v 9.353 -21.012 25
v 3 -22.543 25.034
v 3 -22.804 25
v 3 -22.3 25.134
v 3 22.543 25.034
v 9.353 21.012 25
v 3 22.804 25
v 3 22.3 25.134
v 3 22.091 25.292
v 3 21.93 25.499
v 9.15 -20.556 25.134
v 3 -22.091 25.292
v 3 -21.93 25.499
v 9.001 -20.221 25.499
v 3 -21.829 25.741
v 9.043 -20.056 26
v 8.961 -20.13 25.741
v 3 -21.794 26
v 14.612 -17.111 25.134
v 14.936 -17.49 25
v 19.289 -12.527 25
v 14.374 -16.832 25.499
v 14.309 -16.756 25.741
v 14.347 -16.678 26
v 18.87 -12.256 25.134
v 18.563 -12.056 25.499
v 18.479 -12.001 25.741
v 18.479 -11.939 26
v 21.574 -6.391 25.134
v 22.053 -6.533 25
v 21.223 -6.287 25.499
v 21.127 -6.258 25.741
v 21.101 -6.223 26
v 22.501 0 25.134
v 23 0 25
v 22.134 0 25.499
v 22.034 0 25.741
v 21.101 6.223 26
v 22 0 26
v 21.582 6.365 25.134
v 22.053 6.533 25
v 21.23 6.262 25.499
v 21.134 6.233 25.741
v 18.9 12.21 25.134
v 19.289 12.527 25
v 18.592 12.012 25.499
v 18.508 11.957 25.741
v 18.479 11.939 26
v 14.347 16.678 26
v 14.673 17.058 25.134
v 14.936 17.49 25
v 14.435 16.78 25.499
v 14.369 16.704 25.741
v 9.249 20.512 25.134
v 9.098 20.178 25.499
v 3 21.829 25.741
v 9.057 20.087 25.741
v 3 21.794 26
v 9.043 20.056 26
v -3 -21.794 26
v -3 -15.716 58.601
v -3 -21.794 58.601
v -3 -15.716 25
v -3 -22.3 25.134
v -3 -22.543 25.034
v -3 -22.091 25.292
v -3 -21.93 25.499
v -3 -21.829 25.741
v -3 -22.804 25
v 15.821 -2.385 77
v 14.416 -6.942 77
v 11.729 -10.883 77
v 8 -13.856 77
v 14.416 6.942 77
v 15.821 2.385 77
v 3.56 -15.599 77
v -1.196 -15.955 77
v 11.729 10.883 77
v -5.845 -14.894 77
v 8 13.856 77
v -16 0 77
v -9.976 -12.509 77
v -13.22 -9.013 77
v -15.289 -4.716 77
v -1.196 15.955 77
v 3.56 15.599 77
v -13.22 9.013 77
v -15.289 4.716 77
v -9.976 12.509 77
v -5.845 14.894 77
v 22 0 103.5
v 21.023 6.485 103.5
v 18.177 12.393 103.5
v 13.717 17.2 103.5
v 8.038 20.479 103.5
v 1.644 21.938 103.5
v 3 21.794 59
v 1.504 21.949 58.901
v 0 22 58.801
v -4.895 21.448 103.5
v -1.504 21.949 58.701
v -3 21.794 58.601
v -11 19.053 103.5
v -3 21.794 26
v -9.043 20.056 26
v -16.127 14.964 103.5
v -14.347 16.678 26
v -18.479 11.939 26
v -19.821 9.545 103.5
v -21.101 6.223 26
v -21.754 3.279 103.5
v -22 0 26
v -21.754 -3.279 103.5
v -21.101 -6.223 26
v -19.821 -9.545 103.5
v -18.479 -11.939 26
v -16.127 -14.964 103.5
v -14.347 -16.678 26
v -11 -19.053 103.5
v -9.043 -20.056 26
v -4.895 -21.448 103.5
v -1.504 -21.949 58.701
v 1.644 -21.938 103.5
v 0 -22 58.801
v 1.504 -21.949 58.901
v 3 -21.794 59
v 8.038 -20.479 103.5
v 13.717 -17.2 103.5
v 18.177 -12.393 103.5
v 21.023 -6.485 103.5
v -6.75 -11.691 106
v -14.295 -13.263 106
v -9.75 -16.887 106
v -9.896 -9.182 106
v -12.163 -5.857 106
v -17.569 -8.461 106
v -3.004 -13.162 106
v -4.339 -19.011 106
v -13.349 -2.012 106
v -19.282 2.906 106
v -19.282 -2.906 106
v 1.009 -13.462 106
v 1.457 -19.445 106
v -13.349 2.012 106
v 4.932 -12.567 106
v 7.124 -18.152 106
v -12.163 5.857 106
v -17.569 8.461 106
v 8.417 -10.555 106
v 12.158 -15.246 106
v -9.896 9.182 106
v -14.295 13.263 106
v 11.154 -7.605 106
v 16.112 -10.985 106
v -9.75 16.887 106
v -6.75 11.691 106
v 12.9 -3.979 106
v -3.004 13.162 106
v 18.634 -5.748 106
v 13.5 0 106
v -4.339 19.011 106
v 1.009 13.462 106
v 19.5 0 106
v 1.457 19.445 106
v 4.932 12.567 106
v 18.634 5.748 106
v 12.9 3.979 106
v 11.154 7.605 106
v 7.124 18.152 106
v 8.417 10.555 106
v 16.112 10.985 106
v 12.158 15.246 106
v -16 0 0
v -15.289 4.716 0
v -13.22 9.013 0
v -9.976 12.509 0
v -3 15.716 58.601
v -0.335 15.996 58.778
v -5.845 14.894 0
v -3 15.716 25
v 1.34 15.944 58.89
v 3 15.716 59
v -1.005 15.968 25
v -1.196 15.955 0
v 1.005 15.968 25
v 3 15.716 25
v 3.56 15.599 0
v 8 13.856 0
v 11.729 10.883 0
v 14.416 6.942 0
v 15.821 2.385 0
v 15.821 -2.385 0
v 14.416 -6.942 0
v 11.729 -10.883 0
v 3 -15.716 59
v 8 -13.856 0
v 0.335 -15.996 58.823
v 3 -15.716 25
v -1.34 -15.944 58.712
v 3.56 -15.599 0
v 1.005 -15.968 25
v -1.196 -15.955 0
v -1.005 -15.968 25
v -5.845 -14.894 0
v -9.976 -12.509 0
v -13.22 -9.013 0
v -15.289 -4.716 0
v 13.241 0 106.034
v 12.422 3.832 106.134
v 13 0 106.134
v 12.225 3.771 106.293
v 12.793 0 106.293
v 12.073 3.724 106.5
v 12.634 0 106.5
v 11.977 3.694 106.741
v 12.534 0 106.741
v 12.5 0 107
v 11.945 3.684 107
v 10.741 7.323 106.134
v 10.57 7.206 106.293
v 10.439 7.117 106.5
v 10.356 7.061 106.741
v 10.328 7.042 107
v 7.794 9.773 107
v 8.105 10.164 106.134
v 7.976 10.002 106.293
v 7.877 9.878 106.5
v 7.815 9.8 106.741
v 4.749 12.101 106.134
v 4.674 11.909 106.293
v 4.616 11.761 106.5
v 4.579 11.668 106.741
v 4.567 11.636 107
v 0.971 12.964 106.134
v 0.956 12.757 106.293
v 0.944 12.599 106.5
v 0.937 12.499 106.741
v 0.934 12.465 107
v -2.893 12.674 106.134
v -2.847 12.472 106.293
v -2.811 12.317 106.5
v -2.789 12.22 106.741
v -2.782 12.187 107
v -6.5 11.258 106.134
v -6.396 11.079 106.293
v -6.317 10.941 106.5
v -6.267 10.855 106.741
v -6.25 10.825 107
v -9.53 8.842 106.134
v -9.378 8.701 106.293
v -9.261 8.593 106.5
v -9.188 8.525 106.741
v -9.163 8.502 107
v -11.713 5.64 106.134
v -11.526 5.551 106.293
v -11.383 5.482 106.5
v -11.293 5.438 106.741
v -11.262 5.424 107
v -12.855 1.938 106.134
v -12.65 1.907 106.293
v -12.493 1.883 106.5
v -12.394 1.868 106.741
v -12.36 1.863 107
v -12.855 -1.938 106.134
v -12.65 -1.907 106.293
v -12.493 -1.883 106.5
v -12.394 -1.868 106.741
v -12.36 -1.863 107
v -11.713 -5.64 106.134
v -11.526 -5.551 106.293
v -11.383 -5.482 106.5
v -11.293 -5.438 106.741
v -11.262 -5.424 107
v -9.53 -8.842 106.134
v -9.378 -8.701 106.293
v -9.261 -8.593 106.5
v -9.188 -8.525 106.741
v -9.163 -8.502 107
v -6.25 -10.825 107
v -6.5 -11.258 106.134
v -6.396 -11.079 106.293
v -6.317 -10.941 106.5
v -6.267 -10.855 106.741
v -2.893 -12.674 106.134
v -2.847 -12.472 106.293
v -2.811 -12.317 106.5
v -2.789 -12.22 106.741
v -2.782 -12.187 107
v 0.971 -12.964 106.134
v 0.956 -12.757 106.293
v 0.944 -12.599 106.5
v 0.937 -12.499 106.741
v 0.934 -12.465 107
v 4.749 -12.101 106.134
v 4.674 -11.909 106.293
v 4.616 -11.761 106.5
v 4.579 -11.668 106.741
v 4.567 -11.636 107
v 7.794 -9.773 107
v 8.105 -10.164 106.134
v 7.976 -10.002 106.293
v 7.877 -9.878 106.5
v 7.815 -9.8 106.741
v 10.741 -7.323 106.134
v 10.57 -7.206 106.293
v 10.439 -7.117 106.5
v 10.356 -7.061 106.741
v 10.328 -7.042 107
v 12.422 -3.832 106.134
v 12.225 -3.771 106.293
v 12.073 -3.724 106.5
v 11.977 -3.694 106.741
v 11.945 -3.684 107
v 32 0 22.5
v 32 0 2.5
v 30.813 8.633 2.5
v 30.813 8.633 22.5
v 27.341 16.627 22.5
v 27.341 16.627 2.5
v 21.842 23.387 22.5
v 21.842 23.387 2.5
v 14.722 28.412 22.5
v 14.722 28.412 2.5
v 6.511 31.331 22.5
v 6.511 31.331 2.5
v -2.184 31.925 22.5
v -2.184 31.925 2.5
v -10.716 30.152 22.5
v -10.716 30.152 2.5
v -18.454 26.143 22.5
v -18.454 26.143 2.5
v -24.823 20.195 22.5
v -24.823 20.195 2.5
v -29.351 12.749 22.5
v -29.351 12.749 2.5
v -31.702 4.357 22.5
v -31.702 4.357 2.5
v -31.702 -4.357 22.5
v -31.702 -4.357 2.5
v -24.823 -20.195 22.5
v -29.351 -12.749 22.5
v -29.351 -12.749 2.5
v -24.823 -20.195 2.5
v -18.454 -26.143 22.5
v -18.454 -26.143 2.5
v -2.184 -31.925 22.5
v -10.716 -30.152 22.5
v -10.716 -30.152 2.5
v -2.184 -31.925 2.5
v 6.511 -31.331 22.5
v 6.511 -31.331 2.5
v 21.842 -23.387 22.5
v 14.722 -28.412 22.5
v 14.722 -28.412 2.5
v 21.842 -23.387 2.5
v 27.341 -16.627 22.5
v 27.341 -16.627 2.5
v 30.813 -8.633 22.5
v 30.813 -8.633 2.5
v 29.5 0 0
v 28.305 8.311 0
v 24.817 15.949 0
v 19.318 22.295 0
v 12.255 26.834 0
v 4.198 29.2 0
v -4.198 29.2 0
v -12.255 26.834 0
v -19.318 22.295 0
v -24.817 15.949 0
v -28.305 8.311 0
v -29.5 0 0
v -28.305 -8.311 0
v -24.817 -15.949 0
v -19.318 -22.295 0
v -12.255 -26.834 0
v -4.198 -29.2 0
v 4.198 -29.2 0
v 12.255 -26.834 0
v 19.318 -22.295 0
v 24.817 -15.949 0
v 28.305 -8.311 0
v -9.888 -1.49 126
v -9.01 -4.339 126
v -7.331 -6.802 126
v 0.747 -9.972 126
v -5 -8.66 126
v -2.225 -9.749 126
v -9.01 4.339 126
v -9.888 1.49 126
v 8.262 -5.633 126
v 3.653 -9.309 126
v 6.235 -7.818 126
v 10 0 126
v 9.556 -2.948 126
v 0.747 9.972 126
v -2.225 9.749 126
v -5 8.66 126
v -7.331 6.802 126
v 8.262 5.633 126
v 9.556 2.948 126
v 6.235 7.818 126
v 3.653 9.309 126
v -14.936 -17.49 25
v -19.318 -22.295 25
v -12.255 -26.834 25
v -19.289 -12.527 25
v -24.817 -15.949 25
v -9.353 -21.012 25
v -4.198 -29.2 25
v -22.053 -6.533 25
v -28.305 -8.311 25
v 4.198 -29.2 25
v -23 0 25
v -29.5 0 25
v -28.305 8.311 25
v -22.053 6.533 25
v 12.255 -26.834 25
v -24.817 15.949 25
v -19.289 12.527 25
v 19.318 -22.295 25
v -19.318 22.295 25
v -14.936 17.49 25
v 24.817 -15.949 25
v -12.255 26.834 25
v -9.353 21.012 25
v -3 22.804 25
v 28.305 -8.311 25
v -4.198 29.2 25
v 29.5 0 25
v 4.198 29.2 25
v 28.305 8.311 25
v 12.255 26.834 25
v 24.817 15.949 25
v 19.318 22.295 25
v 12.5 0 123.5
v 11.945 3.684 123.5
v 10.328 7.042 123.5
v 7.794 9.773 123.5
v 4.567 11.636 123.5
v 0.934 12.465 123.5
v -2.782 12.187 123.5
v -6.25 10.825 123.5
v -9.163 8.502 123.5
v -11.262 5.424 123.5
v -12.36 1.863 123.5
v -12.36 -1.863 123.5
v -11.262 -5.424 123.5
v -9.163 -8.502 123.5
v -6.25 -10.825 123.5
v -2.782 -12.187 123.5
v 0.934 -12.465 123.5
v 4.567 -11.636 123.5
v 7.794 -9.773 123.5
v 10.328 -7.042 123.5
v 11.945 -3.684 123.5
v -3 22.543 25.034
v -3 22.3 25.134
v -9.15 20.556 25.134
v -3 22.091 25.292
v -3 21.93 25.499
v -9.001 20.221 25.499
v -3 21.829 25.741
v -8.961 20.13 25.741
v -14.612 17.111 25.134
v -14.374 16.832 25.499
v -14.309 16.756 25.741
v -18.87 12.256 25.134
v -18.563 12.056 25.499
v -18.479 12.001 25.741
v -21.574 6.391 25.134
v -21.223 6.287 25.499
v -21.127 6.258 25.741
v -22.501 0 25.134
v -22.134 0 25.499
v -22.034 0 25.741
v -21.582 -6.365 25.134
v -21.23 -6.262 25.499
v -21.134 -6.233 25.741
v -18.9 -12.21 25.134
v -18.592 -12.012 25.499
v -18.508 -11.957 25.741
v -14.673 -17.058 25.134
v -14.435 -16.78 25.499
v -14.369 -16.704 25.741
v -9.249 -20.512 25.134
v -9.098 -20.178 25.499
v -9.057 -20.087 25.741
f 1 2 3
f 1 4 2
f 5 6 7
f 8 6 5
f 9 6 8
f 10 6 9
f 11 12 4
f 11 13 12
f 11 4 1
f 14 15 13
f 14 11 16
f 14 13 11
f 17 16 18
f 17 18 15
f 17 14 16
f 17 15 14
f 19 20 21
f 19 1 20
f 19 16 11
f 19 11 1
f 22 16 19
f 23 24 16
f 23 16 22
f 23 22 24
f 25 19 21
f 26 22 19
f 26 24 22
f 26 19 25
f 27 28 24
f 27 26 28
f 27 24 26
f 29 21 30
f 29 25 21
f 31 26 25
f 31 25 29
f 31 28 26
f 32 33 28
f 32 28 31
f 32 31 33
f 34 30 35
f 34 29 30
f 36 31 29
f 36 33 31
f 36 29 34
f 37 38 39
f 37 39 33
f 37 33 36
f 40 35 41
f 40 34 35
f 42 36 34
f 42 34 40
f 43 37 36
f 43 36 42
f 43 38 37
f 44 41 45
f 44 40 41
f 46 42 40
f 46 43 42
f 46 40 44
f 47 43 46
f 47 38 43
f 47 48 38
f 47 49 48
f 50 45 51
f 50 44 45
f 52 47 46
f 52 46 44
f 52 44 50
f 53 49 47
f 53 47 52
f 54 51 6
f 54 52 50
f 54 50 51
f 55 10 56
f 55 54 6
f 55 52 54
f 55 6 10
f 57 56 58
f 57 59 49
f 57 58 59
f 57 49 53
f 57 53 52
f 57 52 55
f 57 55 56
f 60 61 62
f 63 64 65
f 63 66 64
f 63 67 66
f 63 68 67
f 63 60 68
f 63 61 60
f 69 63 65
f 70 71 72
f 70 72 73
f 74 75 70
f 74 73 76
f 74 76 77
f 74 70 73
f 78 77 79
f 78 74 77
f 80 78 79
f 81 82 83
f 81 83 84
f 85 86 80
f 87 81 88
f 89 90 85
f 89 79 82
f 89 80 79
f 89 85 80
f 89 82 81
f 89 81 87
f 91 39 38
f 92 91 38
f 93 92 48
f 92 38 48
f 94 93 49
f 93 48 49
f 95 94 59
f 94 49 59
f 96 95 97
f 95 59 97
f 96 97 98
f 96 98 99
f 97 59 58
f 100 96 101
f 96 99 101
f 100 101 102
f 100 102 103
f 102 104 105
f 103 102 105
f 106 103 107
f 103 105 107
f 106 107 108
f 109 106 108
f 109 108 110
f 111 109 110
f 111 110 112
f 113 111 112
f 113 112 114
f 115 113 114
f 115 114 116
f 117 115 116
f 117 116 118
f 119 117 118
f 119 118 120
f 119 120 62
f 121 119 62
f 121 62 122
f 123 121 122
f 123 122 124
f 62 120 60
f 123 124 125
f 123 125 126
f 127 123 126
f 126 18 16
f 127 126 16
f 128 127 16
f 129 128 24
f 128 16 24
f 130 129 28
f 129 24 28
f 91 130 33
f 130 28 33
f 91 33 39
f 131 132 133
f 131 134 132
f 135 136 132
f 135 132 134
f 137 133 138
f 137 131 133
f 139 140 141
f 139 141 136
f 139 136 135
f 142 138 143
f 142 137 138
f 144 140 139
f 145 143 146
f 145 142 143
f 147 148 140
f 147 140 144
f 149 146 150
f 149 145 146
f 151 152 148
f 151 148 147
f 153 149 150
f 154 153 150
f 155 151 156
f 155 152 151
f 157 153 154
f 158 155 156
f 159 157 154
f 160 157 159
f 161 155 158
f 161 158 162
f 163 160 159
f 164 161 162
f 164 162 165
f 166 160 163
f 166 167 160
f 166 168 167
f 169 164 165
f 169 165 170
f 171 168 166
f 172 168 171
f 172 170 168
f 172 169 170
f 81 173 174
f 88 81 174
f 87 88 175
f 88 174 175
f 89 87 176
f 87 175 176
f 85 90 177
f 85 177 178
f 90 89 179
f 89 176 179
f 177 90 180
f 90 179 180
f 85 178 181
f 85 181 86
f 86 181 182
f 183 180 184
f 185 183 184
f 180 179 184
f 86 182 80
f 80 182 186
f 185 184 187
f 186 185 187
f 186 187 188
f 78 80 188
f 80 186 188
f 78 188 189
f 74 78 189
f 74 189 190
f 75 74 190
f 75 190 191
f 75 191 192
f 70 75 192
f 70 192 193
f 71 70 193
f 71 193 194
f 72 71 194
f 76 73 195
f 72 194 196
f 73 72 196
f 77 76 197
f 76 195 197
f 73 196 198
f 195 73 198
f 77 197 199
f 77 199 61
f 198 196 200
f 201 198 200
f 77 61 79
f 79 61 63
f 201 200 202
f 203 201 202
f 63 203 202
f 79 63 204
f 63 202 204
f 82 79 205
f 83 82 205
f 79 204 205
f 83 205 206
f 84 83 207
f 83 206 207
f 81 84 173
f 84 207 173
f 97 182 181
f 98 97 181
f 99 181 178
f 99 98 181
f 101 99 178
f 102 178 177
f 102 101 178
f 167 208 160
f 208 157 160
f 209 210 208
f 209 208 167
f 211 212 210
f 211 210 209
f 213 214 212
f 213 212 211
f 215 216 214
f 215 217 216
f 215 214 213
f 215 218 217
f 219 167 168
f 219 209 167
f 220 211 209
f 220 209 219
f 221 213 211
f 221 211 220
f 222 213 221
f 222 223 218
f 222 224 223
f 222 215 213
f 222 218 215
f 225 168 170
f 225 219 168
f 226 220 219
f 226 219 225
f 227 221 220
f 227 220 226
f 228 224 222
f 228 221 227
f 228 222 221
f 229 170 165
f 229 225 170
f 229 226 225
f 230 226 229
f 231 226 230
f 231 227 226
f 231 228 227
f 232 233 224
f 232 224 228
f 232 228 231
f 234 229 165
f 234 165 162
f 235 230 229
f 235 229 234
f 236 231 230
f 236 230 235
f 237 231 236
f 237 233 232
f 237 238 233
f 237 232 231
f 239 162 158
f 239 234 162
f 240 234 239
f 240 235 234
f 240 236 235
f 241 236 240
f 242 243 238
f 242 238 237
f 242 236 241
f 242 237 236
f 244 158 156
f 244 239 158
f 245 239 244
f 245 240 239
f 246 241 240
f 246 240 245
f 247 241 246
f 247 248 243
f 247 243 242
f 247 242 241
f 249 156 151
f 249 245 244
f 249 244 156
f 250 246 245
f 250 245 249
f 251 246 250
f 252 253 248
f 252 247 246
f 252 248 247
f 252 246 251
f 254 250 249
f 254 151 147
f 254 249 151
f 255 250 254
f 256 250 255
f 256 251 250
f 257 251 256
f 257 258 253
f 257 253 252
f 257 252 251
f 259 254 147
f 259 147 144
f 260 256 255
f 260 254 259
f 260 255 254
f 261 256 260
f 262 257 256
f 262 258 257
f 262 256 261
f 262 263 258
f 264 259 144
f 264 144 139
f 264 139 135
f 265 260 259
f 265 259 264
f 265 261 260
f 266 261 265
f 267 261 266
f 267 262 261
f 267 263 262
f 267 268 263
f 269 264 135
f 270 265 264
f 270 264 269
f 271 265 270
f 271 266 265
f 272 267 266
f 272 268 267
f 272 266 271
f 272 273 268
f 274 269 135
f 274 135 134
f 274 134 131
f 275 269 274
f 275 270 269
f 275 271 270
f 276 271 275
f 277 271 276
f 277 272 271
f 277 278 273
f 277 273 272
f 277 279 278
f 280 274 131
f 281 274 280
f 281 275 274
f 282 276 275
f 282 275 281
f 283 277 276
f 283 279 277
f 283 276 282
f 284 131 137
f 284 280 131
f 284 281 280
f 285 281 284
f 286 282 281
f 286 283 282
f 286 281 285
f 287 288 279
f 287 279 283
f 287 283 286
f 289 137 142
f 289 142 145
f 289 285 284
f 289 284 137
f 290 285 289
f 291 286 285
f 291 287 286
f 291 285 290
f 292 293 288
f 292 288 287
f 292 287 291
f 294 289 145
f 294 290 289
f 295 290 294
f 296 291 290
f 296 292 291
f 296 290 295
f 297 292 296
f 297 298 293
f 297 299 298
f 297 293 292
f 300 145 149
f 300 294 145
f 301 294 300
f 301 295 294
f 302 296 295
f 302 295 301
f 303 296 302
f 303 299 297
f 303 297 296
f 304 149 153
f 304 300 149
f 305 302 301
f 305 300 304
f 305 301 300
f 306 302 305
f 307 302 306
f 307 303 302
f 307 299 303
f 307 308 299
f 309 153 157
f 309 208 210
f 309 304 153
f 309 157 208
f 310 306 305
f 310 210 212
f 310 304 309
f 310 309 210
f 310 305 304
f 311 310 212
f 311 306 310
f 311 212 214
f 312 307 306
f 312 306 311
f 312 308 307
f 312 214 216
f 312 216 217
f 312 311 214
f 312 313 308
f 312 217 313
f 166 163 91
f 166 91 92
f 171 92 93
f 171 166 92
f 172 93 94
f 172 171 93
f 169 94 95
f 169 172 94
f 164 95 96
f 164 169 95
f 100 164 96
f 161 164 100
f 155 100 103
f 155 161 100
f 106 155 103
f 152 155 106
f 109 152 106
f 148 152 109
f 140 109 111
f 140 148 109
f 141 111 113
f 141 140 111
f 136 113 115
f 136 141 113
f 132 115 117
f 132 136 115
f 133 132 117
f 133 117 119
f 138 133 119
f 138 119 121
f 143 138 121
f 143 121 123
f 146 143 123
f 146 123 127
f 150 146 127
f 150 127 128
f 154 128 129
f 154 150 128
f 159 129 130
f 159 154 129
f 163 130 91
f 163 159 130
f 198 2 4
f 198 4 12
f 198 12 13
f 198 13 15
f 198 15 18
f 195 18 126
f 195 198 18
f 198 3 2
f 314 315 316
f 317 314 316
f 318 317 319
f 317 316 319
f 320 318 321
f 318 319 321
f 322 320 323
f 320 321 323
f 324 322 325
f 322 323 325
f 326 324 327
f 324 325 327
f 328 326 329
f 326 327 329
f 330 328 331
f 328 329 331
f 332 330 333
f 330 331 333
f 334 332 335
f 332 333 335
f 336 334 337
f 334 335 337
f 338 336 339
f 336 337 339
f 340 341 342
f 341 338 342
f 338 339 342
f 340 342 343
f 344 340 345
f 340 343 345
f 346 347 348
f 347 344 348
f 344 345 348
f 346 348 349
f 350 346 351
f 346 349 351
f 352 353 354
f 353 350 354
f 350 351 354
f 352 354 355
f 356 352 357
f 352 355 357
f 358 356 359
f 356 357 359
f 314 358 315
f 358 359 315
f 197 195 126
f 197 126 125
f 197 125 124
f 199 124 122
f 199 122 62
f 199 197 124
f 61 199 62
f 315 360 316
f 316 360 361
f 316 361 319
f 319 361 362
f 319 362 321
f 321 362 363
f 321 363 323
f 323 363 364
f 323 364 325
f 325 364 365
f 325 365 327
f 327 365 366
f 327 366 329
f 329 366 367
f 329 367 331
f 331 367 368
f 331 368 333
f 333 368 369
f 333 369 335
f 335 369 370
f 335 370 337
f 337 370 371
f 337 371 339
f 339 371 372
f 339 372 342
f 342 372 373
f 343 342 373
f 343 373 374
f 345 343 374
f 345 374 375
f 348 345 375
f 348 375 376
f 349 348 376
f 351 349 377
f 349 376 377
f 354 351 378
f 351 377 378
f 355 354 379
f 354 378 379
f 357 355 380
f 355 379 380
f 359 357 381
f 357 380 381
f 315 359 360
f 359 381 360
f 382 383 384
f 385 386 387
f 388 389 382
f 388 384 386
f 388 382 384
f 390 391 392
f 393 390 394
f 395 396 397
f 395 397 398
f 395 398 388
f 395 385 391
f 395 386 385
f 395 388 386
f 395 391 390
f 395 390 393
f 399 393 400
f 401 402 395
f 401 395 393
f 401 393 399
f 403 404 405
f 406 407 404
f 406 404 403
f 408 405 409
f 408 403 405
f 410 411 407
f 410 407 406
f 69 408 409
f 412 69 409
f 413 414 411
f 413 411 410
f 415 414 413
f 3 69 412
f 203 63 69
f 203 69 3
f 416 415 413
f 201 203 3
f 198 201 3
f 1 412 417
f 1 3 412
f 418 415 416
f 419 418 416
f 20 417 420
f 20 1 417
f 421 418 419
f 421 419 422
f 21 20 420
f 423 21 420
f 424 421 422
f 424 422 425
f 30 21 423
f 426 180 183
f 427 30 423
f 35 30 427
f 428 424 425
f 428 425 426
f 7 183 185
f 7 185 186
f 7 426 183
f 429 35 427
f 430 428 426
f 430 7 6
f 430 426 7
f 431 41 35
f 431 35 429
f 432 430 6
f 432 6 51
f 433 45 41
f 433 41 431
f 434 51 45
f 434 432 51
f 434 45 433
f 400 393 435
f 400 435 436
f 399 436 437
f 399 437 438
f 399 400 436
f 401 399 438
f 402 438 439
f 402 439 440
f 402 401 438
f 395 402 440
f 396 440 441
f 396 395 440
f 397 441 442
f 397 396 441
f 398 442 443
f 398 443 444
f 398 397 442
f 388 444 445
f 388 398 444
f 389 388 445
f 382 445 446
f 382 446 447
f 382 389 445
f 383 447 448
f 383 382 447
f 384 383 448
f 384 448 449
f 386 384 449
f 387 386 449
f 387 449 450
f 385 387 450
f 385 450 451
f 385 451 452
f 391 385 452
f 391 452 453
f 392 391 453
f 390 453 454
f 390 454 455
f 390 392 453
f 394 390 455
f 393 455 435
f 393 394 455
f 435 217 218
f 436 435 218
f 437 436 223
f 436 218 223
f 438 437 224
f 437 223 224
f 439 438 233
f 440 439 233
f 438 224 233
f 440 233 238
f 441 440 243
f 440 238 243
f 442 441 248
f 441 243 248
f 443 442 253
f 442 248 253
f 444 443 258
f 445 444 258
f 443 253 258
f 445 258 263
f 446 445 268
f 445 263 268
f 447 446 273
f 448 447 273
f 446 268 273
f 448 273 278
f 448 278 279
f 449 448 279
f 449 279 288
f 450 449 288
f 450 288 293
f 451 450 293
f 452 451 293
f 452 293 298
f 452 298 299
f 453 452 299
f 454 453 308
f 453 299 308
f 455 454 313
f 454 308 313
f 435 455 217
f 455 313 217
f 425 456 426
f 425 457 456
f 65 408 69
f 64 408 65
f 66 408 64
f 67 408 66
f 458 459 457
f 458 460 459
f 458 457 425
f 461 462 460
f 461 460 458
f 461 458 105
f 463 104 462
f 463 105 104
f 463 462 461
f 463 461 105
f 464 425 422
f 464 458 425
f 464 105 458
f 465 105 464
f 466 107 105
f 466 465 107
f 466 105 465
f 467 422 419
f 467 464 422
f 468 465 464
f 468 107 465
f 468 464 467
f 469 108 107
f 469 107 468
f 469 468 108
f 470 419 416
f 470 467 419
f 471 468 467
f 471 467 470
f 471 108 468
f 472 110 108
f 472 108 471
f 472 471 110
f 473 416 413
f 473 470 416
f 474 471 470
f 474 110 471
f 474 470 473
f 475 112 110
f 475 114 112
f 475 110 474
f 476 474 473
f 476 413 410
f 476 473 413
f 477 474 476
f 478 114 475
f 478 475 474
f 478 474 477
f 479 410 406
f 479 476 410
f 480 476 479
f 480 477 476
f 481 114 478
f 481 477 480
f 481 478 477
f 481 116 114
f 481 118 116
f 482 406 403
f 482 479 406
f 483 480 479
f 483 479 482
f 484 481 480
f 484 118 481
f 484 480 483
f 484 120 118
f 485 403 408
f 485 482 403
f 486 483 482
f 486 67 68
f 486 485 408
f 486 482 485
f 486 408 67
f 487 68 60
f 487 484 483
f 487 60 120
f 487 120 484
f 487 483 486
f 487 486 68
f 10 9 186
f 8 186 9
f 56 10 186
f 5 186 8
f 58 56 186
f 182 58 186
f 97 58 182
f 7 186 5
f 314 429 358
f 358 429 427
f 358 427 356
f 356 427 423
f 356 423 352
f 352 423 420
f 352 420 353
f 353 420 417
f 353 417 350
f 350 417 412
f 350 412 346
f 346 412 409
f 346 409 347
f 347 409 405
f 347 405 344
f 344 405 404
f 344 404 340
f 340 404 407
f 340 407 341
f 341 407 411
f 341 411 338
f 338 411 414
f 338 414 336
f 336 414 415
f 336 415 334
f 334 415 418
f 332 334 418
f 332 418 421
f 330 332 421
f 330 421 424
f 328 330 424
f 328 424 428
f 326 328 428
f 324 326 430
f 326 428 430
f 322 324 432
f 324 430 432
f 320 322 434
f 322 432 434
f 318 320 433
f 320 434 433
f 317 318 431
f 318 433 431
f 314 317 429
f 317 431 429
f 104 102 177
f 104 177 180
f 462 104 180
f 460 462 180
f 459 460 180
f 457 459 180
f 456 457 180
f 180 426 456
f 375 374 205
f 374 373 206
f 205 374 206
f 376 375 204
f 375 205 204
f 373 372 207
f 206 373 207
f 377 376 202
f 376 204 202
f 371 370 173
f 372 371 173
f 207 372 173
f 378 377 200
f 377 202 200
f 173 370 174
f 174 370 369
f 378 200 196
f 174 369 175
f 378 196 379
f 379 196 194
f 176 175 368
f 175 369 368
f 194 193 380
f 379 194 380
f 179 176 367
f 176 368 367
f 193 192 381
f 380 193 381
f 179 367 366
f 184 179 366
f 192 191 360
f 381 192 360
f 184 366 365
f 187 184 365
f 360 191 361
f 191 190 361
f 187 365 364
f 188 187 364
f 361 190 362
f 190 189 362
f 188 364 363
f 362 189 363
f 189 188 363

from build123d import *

# Parameters (mm, degrees)
SKETCH1_R           = 32
BOSS_EXTRUDE1_DEPTH = 25
SKETCH2_R           = 22
BOSS_EXTRUDE2_DEPTH = 81
SKETCH3_R           = 12.5
BOSS_EXTRUDE3_DEPTH = 20
SKETCH4_R           = 16
CUT_EXTRUDE1_DEPTH  = 77
CUT_EXTRUDE2_DEPTH  = 145.899965493
CHAMFER1_SIZE       = 2.5
FILLET1_R           = 1


with BuildPart() as part:
    # Sketch1 → Boss-Extrude1 (new body)
    with BuildSketch(Plane.XY):
        Circle(SKETCH1_R)
    extrude(amount=BOSS_EXTRUDE1_DEPTH)

    # Sketch2 → Boss-Extrude2 (add)
    with BuildSketch(Plane.XY.offset(25)):
        Circle(SKETCH2_R)
    extrude(amount=BOSS_EXTRUDE2_DEPTH)

    # Sketch3 → Boss-Extrude3 (add)
    with BuildSketch(Plane.XY.offset(106)):
        Circle(SKETCH3_R)
    extrude(amount=BOSS_EXTRUDE3_DEPTH)

    # Sketch4 → Cut-Extrude1 (cut)
    with BuildSketch(Plane(origin=(0, 0, 0), x_dir=(-1, 0, 0), z_dir=(0, 0, -1))):
        Circle(SKETCH4_R)
    extrude(amount=-CUT_EXTRUDE1_DEPTH, mode=Mode.SUBTRACT)

    # Sketch5 → Cut-Extrude2 (cut, through all)
    with BuildSketch(Plane(origin=(0, 32, 0), x_dir=(1, 0, 0), z_dir=(0, 1, 0))):
        Polygon((3, -25), (3, -59), (-3, -58.60148044), (-3, -25), align=None)
    extrude(amount=-CUT_EXTRUDE2_DEPTH, mode=Mode.SUBTRACT)

    # Chamfer1
    chamfer1_edges = [part.edges().sort_by_distance(p)[0] for p in [
        (-12.5, 0, 126),
        (-32, 0, 0),
        (-32, 0, 25),
        (-22, 0, 106),
    ]]
    chamfer(chamfer1_edges, length=CHAMFER1_SIZE)

    # Fillet1
    fillet1_edges = [part.edges().sort_by_distance(p)[0] for p in [
        (-12.5, 0, 106),
        (-22, 0, 25),
        (16.583123952, 14.456832295, 25),
    ]]
    fillet(fillet1_edges, radius=FILLET1_R)


solid = part.part
